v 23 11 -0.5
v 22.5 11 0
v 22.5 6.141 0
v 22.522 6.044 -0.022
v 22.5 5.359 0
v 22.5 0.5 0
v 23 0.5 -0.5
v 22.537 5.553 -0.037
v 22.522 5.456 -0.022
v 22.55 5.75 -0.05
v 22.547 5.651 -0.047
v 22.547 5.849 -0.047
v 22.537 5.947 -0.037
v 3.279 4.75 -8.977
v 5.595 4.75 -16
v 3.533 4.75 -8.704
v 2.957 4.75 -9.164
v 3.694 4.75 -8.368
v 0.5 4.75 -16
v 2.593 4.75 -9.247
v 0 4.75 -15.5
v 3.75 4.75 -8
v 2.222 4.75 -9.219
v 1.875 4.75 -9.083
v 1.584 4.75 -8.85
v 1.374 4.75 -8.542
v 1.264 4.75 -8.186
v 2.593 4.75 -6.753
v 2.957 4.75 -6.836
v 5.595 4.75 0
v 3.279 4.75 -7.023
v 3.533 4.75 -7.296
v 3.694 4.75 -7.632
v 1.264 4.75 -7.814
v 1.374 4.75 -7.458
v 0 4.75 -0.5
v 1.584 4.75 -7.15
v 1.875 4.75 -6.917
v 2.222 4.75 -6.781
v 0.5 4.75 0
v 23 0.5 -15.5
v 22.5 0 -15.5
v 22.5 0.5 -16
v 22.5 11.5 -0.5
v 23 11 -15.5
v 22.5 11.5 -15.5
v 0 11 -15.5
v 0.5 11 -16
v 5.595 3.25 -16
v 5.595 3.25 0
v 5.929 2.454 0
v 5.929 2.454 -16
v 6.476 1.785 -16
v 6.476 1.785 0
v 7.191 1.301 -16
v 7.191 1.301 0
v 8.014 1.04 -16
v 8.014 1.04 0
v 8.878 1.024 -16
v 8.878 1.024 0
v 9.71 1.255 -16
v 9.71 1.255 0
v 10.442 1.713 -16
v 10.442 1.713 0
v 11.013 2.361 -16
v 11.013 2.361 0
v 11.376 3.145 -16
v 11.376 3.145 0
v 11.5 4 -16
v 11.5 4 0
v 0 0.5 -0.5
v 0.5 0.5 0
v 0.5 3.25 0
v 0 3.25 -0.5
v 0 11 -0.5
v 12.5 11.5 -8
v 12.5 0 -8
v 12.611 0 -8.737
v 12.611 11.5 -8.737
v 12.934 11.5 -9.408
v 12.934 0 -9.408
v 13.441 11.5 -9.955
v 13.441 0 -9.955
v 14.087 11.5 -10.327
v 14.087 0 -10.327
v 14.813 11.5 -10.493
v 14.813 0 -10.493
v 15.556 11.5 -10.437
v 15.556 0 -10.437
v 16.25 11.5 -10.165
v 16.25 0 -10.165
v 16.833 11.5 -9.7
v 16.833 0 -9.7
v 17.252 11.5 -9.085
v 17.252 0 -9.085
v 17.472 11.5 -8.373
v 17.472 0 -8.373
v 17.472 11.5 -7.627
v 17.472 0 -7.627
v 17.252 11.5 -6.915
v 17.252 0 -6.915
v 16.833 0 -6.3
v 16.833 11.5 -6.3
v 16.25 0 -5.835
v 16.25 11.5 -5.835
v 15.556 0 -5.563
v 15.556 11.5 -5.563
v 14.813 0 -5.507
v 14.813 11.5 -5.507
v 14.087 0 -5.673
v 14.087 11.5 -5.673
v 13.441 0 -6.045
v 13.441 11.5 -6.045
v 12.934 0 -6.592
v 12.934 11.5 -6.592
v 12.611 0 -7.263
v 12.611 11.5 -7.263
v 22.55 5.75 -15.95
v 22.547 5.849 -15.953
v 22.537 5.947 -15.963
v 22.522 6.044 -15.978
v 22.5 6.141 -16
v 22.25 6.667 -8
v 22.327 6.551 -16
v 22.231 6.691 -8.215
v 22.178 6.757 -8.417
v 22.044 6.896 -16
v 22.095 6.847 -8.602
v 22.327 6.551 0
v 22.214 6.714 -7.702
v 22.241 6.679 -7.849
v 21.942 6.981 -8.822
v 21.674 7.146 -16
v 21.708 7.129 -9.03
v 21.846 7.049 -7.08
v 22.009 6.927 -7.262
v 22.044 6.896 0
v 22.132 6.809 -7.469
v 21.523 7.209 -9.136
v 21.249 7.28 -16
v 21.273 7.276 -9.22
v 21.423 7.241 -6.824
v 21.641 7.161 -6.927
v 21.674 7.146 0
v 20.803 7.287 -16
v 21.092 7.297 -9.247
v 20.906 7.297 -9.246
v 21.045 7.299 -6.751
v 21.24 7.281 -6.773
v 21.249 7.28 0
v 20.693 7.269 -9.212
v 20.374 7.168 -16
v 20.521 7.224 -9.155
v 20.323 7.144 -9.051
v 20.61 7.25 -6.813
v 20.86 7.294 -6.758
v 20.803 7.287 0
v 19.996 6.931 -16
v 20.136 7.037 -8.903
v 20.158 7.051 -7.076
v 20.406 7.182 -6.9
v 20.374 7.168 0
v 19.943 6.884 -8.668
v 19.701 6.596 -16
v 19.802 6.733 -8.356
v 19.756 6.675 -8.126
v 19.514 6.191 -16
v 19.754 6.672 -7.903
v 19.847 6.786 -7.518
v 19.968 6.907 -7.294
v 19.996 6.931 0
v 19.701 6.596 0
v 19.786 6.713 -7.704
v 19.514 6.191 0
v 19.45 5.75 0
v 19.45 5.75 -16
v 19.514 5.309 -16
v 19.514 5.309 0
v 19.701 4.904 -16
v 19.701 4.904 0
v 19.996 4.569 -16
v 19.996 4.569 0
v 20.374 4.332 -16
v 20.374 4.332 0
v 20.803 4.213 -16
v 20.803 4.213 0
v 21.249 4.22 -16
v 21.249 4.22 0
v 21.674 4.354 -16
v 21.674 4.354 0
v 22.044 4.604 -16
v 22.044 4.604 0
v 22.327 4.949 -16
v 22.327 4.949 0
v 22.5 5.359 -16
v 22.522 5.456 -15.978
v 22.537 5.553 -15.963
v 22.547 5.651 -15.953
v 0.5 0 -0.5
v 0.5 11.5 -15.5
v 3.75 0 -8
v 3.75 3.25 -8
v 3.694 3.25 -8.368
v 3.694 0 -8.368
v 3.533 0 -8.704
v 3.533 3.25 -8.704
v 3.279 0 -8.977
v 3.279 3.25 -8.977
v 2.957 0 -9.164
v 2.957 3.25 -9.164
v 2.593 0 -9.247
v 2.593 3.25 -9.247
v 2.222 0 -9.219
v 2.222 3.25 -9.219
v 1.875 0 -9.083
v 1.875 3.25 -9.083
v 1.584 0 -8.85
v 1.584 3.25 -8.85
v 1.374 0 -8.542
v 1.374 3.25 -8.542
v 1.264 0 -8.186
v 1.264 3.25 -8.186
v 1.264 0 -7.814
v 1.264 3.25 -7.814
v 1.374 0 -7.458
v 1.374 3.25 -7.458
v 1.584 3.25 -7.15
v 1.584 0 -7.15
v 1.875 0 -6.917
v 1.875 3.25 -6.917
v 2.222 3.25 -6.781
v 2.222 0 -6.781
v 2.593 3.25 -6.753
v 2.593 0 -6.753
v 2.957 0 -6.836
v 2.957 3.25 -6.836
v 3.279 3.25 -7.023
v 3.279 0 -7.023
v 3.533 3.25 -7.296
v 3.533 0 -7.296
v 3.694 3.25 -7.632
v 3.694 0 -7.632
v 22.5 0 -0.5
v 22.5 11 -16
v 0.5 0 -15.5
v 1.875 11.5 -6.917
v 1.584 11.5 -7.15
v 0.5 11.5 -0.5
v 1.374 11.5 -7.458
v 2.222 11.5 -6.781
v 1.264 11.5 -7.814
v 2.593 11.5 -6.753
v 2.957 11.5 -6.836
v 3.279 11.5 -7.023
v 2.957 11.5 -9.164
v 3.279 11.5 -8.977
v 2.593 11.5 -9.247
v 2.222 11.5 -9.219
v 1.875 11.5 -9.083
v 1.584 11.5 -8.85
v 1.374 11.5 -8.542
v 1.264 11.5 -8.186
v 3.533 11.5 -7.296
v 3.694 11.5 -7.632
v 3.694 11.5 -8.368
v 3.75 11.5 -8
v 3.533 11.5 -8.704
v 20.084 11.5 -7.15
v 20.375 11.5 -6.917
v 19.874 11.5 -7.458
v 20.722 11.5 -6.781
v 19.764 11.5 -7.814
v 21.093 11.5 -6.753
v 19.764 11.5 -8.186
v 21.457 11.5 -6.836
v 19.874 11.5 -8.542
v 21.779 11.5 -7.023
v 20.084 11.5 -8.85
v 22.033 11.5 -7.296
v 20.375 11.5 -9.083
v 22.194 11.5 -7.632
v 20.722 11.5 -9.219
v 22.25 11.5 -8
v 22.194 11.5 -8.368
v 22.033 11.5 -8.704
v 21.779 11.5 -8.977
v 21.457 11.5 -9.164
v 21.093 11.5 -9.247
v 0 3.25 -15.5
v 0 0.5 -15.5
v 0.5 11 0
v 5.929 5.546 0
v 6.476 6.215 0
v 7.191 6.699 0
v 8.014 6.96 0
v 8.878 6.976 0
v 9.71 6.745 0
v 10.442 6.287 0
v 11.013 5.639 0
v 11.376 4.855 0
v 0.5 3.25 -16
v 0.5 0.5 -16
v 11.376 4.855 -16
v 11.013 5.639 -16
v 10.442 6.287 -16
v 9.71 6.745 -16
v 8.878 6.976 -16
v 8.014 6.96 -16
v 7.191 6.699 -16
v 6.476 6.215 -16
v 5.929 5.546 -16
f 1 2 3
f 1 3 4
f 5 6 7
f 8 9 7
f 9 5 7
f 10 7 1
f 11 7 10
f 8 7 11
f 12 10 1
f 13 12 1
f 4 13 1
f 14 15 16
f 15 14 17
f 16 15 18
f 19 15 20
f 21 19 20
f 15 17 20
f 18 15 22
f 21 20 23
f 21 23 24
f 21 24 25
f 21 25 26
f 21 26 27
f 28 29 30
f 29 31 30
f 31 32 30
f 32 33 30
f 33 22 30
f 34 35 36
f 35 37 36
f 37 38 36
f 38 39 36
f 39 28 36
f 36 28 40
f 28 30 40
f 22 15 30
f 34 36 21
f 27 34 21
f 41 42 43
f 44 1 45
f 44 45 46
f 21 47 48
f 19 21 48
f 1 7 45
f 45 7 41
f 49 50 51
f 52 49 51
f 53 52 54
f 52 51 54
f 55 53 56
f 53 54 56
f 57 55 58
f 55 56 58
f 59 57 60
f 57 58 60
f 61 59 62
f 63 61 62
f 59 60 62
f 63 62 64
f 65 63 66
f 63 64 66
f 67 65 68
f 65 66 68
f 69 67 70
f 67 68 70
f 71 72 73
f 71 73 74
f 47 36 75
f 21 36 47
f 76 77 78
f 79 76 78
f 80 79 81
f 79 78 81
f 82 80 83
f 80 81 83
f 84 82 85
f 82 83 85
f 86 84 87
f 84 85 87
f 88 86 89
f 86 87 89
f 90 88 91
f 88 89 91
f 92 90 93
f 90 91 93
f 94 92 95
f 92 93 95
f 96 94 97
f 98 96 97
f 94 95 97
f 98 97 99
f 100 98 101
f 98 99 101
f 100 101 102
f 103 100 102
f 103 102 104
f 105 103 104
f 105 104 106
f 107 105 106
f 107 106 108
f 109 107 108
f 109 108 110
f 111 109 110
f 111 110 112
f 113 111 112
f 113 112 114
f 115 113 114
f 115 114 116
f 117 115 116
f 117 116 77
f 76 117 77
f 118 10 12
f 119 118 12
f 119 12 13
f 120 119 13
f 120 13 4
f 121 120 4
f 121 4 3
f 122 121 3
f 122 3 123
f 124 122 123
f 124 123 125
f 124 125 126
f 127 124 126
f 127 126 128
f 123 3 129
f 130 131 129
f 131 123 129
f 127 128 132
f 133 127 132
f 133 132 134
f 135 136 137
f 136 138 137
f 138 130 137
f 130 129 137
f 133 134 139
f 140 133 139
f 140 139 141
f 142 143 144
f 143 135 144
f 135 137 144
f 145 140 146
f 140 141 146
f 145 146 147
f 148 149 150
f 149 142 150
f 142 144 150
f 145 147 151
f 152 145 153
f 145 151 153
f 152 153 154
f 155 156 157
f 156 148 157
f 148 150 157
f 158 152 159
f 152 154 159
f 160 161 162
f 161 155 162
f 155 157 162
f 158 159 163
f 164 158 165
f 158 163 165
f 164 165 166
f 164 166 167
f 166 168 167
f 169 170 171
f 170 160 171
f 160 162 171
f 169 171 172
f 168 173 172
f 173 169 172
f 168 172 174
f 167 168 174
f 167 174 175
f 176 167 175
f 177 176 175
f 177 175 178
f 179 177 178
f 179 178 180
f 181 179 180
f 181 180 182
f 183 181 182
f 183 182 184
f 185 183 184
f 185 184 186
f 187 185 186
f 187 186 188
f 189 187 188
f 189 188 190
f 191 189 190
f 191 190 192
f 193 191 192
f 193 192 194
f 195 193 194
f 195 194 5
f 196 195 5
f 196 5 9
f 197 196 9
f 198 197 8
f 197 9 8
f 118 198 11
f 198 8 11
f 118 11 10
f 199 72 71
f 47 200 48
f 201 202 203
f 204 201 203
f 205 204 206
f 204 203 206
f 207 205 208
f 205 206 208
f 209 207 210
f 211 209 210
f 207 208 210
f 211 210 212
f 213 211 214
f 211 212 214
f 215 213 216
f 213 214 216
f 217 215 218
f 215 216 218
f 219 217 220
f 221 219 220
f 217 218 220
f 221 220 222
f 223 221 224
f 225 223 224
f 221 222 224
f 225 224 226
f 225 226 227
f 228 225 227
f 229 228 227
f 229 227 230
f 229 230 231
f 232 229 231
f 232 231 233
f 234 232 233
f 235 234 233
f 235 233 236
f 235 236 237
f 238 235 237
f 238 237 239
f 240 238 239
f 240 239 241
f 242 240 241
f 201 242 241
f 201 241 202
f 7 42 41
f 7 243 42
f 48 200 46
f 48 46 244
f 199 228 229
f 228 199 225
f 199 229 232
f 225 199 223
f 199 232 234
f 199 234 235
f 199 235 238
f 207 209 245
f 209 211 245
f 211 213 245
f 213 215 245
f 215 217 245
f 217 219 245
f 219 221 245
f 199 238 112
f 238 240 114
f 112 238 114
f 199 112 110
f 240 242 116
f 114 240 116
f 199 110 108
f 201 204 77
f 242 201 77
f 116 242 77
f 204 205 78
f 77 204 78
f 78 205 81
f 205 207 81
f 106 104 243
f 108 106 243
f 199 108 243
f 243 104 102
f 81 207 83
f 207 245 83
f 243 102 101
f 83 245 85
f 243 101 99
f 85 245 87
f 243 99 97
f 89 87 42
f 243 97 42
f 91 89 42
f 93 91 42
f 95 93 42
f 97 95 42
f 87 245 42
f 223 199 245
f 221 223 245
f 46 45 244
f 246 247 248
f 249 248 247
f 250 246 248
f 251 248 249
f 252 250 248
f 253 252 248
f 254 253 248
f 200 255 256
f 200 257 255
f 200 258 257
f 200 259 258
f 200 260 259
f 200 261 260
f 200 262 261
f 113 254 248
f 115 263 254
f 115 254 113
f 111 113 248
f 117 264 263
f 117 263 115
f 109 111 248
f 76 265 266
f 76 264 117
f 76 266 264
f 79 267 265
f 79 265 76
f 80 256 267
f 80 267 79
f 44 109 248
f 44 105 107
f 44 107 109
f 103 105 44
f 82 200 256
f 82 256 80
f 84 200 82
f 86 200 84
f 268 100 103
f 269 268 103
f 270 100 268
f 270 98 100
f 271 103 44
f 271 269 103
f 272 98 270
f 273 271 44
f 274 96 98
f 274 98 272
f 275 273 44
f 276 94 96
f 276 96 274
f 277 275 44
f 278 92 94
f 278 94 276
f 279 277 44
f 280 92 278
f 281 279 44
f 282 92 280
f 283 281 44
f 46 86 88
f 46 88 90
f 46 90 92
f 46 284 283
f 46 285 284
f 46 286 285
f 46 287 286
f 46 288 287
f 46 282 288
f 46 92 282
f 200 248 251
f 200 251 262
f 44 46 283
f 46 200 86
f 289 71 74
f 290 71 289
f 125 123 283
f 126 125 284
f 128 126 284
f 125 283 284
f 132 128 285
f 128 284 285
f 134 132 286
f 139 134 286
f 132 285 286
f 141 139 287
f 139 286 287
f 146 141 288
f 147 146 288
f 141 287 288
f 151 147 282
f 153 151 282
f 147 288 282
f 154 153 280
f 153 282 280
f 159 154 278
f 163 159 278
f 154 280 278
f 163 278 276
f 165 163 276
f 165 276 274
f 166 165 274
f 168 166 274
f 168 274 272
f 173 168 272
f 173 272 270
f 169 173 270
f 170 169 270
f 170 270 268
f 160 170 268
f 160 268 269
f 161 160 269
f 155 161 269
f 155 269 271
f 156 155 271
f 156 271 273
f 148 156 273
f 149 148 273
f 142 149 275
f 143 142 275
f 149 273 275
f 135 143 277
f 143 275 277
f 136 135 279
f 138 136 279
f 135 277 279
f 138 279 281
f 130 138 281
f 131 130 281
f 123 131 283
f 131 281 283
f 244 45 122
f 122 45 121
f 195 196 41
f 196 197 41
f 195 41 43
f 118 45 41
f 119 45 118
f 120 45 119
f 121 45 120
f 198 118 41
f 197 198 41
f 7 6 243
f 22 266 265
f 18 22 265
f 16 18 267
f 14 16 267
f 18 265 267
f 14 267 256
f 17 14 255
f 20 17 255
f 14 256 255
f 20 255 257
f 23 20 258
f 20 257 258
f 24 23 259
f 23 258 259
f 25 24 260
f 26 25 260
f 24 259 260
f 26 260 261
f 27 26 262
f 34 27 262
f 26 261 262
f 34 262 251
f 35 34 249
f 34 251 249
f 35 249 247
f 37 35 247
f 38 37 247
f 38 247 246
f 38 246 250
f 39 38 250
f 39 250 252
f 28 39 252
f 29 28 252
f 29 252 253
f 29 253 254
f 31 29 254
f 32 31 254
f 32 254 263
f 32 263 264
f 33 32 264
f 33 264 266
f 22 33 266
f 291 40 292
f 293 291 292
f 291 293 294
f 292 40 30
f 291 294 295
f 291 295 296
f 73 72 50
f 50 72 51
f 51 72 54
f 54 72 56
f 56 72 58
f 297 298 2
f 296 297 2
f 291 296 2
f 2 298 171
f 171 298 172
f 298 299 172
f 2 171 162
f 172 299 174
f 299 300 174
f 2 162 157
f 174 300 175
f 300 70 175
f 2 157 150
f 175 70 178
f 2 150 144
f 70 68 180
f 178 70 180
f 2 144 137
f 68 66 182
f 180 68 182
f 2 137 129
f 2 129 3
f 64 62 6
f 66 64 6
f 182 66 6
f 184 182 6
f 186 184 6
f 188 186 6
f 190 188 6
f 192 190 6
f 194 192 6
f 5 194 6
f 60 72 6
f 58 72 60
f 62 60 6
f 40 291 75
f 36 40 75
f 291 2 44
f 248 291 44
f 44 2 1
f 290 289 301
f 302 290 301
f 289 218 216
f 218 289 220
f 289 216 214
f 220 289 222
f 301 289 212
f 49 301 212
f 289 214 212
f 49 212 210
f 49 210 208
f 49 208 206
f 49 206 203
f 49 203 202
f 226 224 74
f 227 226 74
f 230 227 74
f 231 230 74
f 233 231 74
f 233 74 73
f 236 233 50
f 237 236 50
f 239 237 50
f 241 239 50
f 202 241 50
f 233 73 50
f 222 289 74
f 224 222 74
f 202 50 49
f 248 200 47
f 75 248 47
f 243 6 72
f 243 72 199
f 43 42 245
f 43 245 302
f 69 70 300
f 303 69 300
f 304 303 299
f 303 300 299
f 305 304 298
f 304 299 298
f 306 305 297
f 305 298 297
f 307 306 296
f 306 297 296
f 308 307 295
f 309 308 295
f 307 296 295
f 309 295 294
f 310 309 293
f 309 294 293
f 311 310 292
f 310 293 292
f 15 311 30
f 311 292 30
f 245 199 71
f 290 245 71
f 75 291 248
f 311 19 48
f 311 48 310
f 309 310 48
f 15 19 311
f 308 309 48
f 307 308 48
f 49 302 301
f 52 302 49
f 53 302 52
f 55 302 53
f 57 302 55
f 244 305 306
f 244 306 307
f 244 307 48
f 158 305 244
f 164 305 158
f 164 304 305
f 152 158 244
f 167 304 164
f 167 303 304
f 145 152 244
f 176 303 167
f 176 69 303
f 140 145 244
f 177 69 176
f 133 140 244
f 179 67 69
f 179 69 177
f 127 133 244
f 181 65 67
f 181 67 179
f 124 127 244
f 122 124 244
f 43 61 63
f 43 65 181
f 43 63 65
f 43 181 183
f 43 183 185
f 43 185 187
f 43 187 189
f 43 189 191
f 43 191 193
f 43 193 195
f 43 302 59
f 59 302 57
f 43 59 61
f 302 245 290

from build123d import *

# Parameters (mm, degrees)
SKETCH1_W                  = 23
SKETCH1_H                  = 16
BOSS_EXTRUDE1_DEPTH        = 11.5
SKETCH10_R                 = 1.55
CUT_EXTRUDE2_DEPTH         = 31.286135442
M3X0_5_TAPPED_HOLE1_REACH  = 32.286
M3X0_5_TAPPED_HOLE1_BORE_R = 1.25
M6_TAPPED_HOLE1_D          = 5
CUT_EXTRUDE1_DEPTH         = 16


with BuildPart() as part:
    # Sketch1 → Boss-Extrude1 (new body)
    with BuildSketch(Plane(origin=(0, 0, 0), x_dir=(1, 0, 0), z_dir=(0, 1, 0))):
        with Locations((11.5, 8)):
            Rectangle(SKETCH1_W, SKETCH1_H)
    extrude(amount=BOSS_EXTRUDE1_DEPTH)

    # Sketch10 → Cut-Extrude2 (cut, through all)
    with BuildSketch(Plane.XY):
        with Locations((21, 5.75)):
            Circle(SKETCH10_R)
    extrude(amount=-CUT_EXTRUDE2_DEPTH, mode=Mode.SUBTRACT)

    # M3x0.5 Tapped Hole1 bore → M3x0.5 Tapped Hole1 (cut, up to next)
    with BuildSketch(Plane(origin=(0, 11.5, 0), x_dir=(1, 0, 0), z_dir=(0, 1, 0)), mode=Mode.PRIVATE) as m3x0_5_tapped_hole1_sk1:
        with Locations((2.5, 8)):
            Circle(M3X0_5_TAPPED_HOLE1_BORE_R)
    m3x0_5_tapped_hole1_tool1 = extrude(m3x0_5_tapped_hole1_sk1.sketch, amount=-M3X0_5_TAPPED_HOLE1_REACH, mode=Mode.PRIVATE) & part.part
    # M3x0.5 Tapped Hole1 bore → M3x0.5 Tapped Hole1 (cut, up to next)
    with BuildSketch(Plane(origin=(0, 11.5, 0), x_dir=(1, 0, 0), z_dir=(0, 1, 0)), mode=Mode.PRIVATE) as m3x0_5_tapped_hole1_sk2:
        with Locations((21, 8)):
            Circle(M3X0_5_TAPPED_HOLE1_BORE_R)
    m3x0_5_tapped_hole1_tool2 = extrude(m3x0_5_tapped_hole1_sk2.sketch, amount=-M3X0_5_TAPPED_HOLE1_REACH, mode=Mode.PRIVATE) & part.part
    add(m3x0_5_tapped_hole1_tool1.solids().sort_by_distance((2.5, 11.5, -8))[0], mode=Mode.SUBTRACT)
    add(m3x0_5_tapped_hole1_tool2.solids().sort_by_distance((21, 11.5, -8))[0], mode=Mode.SUBTRACT)

    # M6 Tapped Hole1 (through all)
    with Locations(Plane(origin=(0, 11.5, 0), x_dir=(1, 0, 0), z_dir=(0, 1, 0))):
        with Locations((15, 8)):
            Hole(M6_TAPPED_HOLE1_D / 2)

    # Sketch2 → Cut-Extrude1 (cut)
    with BuildSketch(Plane.XY):
        with BuildLine():
            Line((5.59526249, 4.75), (0, 4.75))
            Line((0, 4.75), (0, 3.25))
            Line((0, 3.25), (5.59526249, 3.25))
            ThreePointArc((5.59526249, 3.25), (5.5, 4), (5.59526249, 4.75))
        make_face()
        with BuildLine():
            ThreePointArc((11.5, 4), (8.878012877, 6.976089089), (5.59526249, 4.75))
            Line((5.59526249, 4.75), (5.59526249, 3.25))
            ThreePointArc((5.59526249, 3.25), (8.878012877, 1.023910911), (11.5, 4))
        make_face()
        with BuildLine():
            Line((5.59526249, 3.25), (5.59526249, 4.75))
            ThreePointArc((5.59526249, 4.75), (5.5, 4), (5.59526249, 3.25))
        make_face()
    extrude(amount=-CUT_EXTRUDE1_DEPTH, mode=Mode.SUBTRACT)

    # Chamfer1
    # the kernel refuses this chamfer: 0.5 mm, written as the material it takes off along each edge
    with BuildSketch(Plane(origin=(22.666666667, 11.166666667, -0.333333333), x_dir=(0.7071067811865475, 0, -0.7071067811865475), z_dir=(0.5773502691896258, 0.5773502691896258, 0.5773502691896258)), Plane(origin=(0.333333333, 0.333333333, -0.333333333), x_dir=(-0.7071067811865475, 0, -0.7071067811865475), z_dir=(-0.5773502691896257, -0.5773502691896257, 0.5773502691896257)), Plane(origin=(0.333333333, 11.166666667, -0.333333333), x_dir=(0, 0.7071067811865476, -0.7071067811865475), z_dir=(-0.5773502691896258, 0.5773502691896257, 0.5773502691896258)), Plane(origin=(22.666666667, 0.333333333, -15.666666667), x_dir=(0, 0.7071067811865475, -0.7071067811865475), z_dir=(0.5773502691896258, -0.5773502691896258, -0.5773502691896258)), Plane(origin=(22.666666667, 0.333333333, -0.333333333), x_dir=(0, -0.7071067811865475, -0.7071067811865475), z_dir=(0.5773502691896258, -0.5773502691896258, 0.5773502691896258))) as chamfer1_piece_1:
        Polygon((-0.353553391, -0.204124145), (0.353553391, -0.204124145), (0, 0.40824829), align=None)
    extrude(amount=0.635085296, mode=Mode.SUBTRACT)
    with BuildSketch(Plane(origin=(22.666666667, 11.166666667, -15.666666667), x_dir=(0.7071067811865475, 0, 0.7071067811865475), z_dir=(0.5773502691896258, 0.5773502691896258, -0.5773502691896258)), Plane(origin=(0.333333333, 11.166666667, -15.666666667), x_dir=(0, 0.7071067811865475, 0.7071067811865475), z_dir=(-0.5773502691896258, 0.5773502691896257, -0.5773502691896258)), Plane(origin=(0.333333333, 0.333333333, -15.666666667), x_dir=(0.7071067811865475, -0.7071067811865475, 0), z_dir=(-0.5773502691896257, -0.5773502691896257, -0.5773502691896258))) as chamfer1_piece_2:
        Polygon((-0.353553391, 0.204124145), (0.353553391, 0.204124145), (0, -0.40824829), align=None)
    extrude(amount=0.635085296, mode=Mode.SUBTRACT)
    with BuildSketch(Plane(origin=(23, 11.5, 1.285841494), x_dir=(0.0274958766105891, -0.9996219169112968, 0), z_dir=(0, 0, -1)), Plane(origin=(23, 0, 1.285841494), x_dir=(-0.9996219169112968, -0.027495876610586292, 0), z_dir=(0, 0, -1)), Plane(origin=(0, 0, -17.285841494), x_dir=(0.9996219169112968, -0.027495876610586372, 0), z_dir=(0, 0, 1))) as chamfer1_piece_3:
        with BuildLine():
            Line((0.514336598, 0), (-0.028273577, 0.513558897))
            Line((-0.028273577, 0.513558897), (-0.038269797, 0.513283938))
            ThreePointArc((-0.038269797, 0.513283938), (-0.017064614, 0.256698915), (-0.009996219, -0.000274959))
            Line((-0.009996219, -0.000274959), (0.000274959, -0.009996219))
            ThreePointArc((0.000274959, -0.009996219), (0.257248832, -0.002927825), (0.514611556, -0.009996219))
            Line((0.514611556, -0.009996219), (0.514336598, 0))
        make_face()
    extrude(amount=18.571682988, mode=Mode.SUBTRACT)
    with BuildSketch(Plane(origin=(24.285841494, 11.5, -16), x_dir=(0, 0.027495876610585647, 0.9996219169112968), z_dir=(-1, 0, 0)), Plane(origin=(-1.285841494, 0, 0), x_dir=(0, 0.9996219169112968, 0.027495876610586372), z_dir=(1, 0, 0))) as chamfer1_piece_4:
        with BuildLine():
            Line((0.514336598, 0), (-0.028273577, -0.513558897))
            Line((-0.028273577, -0.513558897), (-0.038269797, -0.513283938))
            ThreePointArc((-0.038269797, -0.513283938), (-0.017064614, -0.256698915), (-0.009996219, 0.000274959))
            Line((-0.009996219, 0.000274959), (0.000274959, 0.009996219))
            ThreePointArc((0.000274959, 0.009996219), (0.257248832, 0.002927825), (0.514611556, 0.009996219))
            Line((0.514611556, 0.009996219), (0.514336598, 0))
        make_face()
    extrude(amount=25.571682988, mode=Mode.SUBTRACT)
    with BuildSketch(Plane(origin=(0, -1.285841494, -16), x_dir=(-0.02749587661058639, 0, 0.9996219169112968), z_dir=(0, 1, 0)), Plane(origin=(0, -1.285841494, 0), x_dir=(0.9996219169112968, 0, 0.027495876610586372), z_dir=(0, 1, 0))) as chamfer1_piece_5:
        with BuildLine():
            Line((0.514336598, 0), (-0.028273577, 0.513558897))
            Line((-0.028273577, 0.513558897), (-0.038269797, 0.513283938))
            ThreePointArc((-0.038269797, 0.513283938), (-0.017064614, 0.256698915), (-0.009996219, -0.000274959))
            Line((-0.009996219, -0.000274959), (0.000274959, -0.009996219))
            ThreePointArc((0.000274959, -0.009996219), (0.257248832, -0.002927825), (0.514611556, -0.009996219))
            Line((0.514611556, -0.009996219), (0.514336598, 0))
        make_face()
    extrude(amount=5.821682988, mode=Mode.SUBTRACT)
    with BuildSketch(Plane(origin=(0, 11.5, -17.285841494), x_dir=(0.9996219169112968, 0.02749587661058563, 0), z_dir=(0, 0, 1))) as chamfer1_piece_6:
        with BuildLine():
            Line((0.514336598, 0), (-0.028273577, -0.513558897))
            Line((-0.028273577, -0.513558897), (-0.038269797, -0.513283938))
            ThreePointArc((-0.038269797, -0.513283938), (-0.017064614, -0.256698915), (-0.009996219, 0.000274959))
            Line((-0.009996219, 0.000274959), (0.000274959, 0.009996219))
            ThreePointArc((0.000274959, 0.009996219), (0.257248832, 0.002927825), (0.514611556, 0.009996219))
            Line((0.514611556, 0.009996219), (0.514336598, 0))
        make_face()
    extrude(amount=18.571682988, mode=Mode.SUBTRACT)
    with BuildSketch(Plane(origin=(24.285841494, 0, -16), x_dir=(0, -0.02749587661058639, 0.9996219169112968), z_dir=(-1, 0, 0)), Plane(origin=(-1.285841494, 11.5, 0), x_dir=(0, -0.9996219169112968, 0.02749587661058639), z_dir=(1, 0, 0))) as chamfer1_piece_7:
        with BuildLine():
            Line((0.514336598, 0), (-0.028273577, 0.513558897))
            Line((-0.028273577, 0.513558897), (-0.038269797, 0.513283938))
            ThreePointArc((-0.038269797, 0.513283938), (-0.017064614, 0.256698915), (-0.009996219, -0.000274959))
            Line((-0.009996219, -0.000274959), (0.000274959, -0.009996219))
            ThreePointArc((0.000274959, -0.009996219), (0.257248832, -0.002927825), (0.514611556, -0.009996219))
            Line((0.514611556, -0.009996219), (0.514336598, 0))
        make_face()
    extrude(amount=25.571682988, mode=Mode.SUBTRACT)
    with BuildSketch(Plane(origin=(0, 3.464158506, -16), x_dir=(-0.02749587661058639, 0, 0.9996219169112968), z_dir=(0, 1, 0)), Plane(origin=(0, 3.464158506, 0), x_dir=(0.9996219169112968, 0, 0.027495876610586372), z_dir=(0, 1, 0))) as chamfer1_piece_8:
        with BuildLine():
            Line((0.514336598, 0), (-0.028273577, 0.513558897))
            Line((-0.028273577, 0.513558897), (-0.038269797, 0.513283938))
            ThreePointArc((-0.038269797, 0.513283938), (-0.017064614, 0.256698915), (-0.009996219, -0.000274959))
            Line((-0.009996219, -0.000274959), (0.000274959, -0.009996219))
            ThreePointArc((0.000274959, -0.009996219), (0.257248832, -0.002927825), (0.514611556, -0.009996219))
            Line((0.514611556, -0.009996219), (0.514336598, 0))
        make_face()
    extrude(amount=9.321682988, mode=Mode.SUBTRACT)
    with BuildSketch(Plane(origin=(23, -1.285841494, -16), x_dir=(0.0274958766105891, 0, 0.9996219169112968), z_dir=(0, 1, 0)), Plane(origin=(23, -1.285841494, 0), x_dir=(-0.9996219169112968, 0, 0.027495876610586292), z_dir=(0, 1, 0))) as chamfer1_piece_9:
        with BuildLine():
            Line((0.514336598, 0), (-0.028273577, -0.513558897))
            Line((-0.028273577, -0.513558897), (-0.038269797, -0.513283938))
            ThreePointArc((-0.038269797, -0.513283938), (-0.017064614, -0.256698915), (-0.009996219, 0.000274959))
            Line((-0.009996219, 0.000274959), (0.000274959, 0.009996219))
            ThreePointArc((0.000274959, 0.009996219), (0.257248832, 0.002927825), (0.514611556, 0.009996219))
            Line((0.514611556, 0.009996219), (0.514336598, 0))
        make_face()
    extrude(amount=14.071682988, mode=Mode.SUBTRACT)


solid = part.part
